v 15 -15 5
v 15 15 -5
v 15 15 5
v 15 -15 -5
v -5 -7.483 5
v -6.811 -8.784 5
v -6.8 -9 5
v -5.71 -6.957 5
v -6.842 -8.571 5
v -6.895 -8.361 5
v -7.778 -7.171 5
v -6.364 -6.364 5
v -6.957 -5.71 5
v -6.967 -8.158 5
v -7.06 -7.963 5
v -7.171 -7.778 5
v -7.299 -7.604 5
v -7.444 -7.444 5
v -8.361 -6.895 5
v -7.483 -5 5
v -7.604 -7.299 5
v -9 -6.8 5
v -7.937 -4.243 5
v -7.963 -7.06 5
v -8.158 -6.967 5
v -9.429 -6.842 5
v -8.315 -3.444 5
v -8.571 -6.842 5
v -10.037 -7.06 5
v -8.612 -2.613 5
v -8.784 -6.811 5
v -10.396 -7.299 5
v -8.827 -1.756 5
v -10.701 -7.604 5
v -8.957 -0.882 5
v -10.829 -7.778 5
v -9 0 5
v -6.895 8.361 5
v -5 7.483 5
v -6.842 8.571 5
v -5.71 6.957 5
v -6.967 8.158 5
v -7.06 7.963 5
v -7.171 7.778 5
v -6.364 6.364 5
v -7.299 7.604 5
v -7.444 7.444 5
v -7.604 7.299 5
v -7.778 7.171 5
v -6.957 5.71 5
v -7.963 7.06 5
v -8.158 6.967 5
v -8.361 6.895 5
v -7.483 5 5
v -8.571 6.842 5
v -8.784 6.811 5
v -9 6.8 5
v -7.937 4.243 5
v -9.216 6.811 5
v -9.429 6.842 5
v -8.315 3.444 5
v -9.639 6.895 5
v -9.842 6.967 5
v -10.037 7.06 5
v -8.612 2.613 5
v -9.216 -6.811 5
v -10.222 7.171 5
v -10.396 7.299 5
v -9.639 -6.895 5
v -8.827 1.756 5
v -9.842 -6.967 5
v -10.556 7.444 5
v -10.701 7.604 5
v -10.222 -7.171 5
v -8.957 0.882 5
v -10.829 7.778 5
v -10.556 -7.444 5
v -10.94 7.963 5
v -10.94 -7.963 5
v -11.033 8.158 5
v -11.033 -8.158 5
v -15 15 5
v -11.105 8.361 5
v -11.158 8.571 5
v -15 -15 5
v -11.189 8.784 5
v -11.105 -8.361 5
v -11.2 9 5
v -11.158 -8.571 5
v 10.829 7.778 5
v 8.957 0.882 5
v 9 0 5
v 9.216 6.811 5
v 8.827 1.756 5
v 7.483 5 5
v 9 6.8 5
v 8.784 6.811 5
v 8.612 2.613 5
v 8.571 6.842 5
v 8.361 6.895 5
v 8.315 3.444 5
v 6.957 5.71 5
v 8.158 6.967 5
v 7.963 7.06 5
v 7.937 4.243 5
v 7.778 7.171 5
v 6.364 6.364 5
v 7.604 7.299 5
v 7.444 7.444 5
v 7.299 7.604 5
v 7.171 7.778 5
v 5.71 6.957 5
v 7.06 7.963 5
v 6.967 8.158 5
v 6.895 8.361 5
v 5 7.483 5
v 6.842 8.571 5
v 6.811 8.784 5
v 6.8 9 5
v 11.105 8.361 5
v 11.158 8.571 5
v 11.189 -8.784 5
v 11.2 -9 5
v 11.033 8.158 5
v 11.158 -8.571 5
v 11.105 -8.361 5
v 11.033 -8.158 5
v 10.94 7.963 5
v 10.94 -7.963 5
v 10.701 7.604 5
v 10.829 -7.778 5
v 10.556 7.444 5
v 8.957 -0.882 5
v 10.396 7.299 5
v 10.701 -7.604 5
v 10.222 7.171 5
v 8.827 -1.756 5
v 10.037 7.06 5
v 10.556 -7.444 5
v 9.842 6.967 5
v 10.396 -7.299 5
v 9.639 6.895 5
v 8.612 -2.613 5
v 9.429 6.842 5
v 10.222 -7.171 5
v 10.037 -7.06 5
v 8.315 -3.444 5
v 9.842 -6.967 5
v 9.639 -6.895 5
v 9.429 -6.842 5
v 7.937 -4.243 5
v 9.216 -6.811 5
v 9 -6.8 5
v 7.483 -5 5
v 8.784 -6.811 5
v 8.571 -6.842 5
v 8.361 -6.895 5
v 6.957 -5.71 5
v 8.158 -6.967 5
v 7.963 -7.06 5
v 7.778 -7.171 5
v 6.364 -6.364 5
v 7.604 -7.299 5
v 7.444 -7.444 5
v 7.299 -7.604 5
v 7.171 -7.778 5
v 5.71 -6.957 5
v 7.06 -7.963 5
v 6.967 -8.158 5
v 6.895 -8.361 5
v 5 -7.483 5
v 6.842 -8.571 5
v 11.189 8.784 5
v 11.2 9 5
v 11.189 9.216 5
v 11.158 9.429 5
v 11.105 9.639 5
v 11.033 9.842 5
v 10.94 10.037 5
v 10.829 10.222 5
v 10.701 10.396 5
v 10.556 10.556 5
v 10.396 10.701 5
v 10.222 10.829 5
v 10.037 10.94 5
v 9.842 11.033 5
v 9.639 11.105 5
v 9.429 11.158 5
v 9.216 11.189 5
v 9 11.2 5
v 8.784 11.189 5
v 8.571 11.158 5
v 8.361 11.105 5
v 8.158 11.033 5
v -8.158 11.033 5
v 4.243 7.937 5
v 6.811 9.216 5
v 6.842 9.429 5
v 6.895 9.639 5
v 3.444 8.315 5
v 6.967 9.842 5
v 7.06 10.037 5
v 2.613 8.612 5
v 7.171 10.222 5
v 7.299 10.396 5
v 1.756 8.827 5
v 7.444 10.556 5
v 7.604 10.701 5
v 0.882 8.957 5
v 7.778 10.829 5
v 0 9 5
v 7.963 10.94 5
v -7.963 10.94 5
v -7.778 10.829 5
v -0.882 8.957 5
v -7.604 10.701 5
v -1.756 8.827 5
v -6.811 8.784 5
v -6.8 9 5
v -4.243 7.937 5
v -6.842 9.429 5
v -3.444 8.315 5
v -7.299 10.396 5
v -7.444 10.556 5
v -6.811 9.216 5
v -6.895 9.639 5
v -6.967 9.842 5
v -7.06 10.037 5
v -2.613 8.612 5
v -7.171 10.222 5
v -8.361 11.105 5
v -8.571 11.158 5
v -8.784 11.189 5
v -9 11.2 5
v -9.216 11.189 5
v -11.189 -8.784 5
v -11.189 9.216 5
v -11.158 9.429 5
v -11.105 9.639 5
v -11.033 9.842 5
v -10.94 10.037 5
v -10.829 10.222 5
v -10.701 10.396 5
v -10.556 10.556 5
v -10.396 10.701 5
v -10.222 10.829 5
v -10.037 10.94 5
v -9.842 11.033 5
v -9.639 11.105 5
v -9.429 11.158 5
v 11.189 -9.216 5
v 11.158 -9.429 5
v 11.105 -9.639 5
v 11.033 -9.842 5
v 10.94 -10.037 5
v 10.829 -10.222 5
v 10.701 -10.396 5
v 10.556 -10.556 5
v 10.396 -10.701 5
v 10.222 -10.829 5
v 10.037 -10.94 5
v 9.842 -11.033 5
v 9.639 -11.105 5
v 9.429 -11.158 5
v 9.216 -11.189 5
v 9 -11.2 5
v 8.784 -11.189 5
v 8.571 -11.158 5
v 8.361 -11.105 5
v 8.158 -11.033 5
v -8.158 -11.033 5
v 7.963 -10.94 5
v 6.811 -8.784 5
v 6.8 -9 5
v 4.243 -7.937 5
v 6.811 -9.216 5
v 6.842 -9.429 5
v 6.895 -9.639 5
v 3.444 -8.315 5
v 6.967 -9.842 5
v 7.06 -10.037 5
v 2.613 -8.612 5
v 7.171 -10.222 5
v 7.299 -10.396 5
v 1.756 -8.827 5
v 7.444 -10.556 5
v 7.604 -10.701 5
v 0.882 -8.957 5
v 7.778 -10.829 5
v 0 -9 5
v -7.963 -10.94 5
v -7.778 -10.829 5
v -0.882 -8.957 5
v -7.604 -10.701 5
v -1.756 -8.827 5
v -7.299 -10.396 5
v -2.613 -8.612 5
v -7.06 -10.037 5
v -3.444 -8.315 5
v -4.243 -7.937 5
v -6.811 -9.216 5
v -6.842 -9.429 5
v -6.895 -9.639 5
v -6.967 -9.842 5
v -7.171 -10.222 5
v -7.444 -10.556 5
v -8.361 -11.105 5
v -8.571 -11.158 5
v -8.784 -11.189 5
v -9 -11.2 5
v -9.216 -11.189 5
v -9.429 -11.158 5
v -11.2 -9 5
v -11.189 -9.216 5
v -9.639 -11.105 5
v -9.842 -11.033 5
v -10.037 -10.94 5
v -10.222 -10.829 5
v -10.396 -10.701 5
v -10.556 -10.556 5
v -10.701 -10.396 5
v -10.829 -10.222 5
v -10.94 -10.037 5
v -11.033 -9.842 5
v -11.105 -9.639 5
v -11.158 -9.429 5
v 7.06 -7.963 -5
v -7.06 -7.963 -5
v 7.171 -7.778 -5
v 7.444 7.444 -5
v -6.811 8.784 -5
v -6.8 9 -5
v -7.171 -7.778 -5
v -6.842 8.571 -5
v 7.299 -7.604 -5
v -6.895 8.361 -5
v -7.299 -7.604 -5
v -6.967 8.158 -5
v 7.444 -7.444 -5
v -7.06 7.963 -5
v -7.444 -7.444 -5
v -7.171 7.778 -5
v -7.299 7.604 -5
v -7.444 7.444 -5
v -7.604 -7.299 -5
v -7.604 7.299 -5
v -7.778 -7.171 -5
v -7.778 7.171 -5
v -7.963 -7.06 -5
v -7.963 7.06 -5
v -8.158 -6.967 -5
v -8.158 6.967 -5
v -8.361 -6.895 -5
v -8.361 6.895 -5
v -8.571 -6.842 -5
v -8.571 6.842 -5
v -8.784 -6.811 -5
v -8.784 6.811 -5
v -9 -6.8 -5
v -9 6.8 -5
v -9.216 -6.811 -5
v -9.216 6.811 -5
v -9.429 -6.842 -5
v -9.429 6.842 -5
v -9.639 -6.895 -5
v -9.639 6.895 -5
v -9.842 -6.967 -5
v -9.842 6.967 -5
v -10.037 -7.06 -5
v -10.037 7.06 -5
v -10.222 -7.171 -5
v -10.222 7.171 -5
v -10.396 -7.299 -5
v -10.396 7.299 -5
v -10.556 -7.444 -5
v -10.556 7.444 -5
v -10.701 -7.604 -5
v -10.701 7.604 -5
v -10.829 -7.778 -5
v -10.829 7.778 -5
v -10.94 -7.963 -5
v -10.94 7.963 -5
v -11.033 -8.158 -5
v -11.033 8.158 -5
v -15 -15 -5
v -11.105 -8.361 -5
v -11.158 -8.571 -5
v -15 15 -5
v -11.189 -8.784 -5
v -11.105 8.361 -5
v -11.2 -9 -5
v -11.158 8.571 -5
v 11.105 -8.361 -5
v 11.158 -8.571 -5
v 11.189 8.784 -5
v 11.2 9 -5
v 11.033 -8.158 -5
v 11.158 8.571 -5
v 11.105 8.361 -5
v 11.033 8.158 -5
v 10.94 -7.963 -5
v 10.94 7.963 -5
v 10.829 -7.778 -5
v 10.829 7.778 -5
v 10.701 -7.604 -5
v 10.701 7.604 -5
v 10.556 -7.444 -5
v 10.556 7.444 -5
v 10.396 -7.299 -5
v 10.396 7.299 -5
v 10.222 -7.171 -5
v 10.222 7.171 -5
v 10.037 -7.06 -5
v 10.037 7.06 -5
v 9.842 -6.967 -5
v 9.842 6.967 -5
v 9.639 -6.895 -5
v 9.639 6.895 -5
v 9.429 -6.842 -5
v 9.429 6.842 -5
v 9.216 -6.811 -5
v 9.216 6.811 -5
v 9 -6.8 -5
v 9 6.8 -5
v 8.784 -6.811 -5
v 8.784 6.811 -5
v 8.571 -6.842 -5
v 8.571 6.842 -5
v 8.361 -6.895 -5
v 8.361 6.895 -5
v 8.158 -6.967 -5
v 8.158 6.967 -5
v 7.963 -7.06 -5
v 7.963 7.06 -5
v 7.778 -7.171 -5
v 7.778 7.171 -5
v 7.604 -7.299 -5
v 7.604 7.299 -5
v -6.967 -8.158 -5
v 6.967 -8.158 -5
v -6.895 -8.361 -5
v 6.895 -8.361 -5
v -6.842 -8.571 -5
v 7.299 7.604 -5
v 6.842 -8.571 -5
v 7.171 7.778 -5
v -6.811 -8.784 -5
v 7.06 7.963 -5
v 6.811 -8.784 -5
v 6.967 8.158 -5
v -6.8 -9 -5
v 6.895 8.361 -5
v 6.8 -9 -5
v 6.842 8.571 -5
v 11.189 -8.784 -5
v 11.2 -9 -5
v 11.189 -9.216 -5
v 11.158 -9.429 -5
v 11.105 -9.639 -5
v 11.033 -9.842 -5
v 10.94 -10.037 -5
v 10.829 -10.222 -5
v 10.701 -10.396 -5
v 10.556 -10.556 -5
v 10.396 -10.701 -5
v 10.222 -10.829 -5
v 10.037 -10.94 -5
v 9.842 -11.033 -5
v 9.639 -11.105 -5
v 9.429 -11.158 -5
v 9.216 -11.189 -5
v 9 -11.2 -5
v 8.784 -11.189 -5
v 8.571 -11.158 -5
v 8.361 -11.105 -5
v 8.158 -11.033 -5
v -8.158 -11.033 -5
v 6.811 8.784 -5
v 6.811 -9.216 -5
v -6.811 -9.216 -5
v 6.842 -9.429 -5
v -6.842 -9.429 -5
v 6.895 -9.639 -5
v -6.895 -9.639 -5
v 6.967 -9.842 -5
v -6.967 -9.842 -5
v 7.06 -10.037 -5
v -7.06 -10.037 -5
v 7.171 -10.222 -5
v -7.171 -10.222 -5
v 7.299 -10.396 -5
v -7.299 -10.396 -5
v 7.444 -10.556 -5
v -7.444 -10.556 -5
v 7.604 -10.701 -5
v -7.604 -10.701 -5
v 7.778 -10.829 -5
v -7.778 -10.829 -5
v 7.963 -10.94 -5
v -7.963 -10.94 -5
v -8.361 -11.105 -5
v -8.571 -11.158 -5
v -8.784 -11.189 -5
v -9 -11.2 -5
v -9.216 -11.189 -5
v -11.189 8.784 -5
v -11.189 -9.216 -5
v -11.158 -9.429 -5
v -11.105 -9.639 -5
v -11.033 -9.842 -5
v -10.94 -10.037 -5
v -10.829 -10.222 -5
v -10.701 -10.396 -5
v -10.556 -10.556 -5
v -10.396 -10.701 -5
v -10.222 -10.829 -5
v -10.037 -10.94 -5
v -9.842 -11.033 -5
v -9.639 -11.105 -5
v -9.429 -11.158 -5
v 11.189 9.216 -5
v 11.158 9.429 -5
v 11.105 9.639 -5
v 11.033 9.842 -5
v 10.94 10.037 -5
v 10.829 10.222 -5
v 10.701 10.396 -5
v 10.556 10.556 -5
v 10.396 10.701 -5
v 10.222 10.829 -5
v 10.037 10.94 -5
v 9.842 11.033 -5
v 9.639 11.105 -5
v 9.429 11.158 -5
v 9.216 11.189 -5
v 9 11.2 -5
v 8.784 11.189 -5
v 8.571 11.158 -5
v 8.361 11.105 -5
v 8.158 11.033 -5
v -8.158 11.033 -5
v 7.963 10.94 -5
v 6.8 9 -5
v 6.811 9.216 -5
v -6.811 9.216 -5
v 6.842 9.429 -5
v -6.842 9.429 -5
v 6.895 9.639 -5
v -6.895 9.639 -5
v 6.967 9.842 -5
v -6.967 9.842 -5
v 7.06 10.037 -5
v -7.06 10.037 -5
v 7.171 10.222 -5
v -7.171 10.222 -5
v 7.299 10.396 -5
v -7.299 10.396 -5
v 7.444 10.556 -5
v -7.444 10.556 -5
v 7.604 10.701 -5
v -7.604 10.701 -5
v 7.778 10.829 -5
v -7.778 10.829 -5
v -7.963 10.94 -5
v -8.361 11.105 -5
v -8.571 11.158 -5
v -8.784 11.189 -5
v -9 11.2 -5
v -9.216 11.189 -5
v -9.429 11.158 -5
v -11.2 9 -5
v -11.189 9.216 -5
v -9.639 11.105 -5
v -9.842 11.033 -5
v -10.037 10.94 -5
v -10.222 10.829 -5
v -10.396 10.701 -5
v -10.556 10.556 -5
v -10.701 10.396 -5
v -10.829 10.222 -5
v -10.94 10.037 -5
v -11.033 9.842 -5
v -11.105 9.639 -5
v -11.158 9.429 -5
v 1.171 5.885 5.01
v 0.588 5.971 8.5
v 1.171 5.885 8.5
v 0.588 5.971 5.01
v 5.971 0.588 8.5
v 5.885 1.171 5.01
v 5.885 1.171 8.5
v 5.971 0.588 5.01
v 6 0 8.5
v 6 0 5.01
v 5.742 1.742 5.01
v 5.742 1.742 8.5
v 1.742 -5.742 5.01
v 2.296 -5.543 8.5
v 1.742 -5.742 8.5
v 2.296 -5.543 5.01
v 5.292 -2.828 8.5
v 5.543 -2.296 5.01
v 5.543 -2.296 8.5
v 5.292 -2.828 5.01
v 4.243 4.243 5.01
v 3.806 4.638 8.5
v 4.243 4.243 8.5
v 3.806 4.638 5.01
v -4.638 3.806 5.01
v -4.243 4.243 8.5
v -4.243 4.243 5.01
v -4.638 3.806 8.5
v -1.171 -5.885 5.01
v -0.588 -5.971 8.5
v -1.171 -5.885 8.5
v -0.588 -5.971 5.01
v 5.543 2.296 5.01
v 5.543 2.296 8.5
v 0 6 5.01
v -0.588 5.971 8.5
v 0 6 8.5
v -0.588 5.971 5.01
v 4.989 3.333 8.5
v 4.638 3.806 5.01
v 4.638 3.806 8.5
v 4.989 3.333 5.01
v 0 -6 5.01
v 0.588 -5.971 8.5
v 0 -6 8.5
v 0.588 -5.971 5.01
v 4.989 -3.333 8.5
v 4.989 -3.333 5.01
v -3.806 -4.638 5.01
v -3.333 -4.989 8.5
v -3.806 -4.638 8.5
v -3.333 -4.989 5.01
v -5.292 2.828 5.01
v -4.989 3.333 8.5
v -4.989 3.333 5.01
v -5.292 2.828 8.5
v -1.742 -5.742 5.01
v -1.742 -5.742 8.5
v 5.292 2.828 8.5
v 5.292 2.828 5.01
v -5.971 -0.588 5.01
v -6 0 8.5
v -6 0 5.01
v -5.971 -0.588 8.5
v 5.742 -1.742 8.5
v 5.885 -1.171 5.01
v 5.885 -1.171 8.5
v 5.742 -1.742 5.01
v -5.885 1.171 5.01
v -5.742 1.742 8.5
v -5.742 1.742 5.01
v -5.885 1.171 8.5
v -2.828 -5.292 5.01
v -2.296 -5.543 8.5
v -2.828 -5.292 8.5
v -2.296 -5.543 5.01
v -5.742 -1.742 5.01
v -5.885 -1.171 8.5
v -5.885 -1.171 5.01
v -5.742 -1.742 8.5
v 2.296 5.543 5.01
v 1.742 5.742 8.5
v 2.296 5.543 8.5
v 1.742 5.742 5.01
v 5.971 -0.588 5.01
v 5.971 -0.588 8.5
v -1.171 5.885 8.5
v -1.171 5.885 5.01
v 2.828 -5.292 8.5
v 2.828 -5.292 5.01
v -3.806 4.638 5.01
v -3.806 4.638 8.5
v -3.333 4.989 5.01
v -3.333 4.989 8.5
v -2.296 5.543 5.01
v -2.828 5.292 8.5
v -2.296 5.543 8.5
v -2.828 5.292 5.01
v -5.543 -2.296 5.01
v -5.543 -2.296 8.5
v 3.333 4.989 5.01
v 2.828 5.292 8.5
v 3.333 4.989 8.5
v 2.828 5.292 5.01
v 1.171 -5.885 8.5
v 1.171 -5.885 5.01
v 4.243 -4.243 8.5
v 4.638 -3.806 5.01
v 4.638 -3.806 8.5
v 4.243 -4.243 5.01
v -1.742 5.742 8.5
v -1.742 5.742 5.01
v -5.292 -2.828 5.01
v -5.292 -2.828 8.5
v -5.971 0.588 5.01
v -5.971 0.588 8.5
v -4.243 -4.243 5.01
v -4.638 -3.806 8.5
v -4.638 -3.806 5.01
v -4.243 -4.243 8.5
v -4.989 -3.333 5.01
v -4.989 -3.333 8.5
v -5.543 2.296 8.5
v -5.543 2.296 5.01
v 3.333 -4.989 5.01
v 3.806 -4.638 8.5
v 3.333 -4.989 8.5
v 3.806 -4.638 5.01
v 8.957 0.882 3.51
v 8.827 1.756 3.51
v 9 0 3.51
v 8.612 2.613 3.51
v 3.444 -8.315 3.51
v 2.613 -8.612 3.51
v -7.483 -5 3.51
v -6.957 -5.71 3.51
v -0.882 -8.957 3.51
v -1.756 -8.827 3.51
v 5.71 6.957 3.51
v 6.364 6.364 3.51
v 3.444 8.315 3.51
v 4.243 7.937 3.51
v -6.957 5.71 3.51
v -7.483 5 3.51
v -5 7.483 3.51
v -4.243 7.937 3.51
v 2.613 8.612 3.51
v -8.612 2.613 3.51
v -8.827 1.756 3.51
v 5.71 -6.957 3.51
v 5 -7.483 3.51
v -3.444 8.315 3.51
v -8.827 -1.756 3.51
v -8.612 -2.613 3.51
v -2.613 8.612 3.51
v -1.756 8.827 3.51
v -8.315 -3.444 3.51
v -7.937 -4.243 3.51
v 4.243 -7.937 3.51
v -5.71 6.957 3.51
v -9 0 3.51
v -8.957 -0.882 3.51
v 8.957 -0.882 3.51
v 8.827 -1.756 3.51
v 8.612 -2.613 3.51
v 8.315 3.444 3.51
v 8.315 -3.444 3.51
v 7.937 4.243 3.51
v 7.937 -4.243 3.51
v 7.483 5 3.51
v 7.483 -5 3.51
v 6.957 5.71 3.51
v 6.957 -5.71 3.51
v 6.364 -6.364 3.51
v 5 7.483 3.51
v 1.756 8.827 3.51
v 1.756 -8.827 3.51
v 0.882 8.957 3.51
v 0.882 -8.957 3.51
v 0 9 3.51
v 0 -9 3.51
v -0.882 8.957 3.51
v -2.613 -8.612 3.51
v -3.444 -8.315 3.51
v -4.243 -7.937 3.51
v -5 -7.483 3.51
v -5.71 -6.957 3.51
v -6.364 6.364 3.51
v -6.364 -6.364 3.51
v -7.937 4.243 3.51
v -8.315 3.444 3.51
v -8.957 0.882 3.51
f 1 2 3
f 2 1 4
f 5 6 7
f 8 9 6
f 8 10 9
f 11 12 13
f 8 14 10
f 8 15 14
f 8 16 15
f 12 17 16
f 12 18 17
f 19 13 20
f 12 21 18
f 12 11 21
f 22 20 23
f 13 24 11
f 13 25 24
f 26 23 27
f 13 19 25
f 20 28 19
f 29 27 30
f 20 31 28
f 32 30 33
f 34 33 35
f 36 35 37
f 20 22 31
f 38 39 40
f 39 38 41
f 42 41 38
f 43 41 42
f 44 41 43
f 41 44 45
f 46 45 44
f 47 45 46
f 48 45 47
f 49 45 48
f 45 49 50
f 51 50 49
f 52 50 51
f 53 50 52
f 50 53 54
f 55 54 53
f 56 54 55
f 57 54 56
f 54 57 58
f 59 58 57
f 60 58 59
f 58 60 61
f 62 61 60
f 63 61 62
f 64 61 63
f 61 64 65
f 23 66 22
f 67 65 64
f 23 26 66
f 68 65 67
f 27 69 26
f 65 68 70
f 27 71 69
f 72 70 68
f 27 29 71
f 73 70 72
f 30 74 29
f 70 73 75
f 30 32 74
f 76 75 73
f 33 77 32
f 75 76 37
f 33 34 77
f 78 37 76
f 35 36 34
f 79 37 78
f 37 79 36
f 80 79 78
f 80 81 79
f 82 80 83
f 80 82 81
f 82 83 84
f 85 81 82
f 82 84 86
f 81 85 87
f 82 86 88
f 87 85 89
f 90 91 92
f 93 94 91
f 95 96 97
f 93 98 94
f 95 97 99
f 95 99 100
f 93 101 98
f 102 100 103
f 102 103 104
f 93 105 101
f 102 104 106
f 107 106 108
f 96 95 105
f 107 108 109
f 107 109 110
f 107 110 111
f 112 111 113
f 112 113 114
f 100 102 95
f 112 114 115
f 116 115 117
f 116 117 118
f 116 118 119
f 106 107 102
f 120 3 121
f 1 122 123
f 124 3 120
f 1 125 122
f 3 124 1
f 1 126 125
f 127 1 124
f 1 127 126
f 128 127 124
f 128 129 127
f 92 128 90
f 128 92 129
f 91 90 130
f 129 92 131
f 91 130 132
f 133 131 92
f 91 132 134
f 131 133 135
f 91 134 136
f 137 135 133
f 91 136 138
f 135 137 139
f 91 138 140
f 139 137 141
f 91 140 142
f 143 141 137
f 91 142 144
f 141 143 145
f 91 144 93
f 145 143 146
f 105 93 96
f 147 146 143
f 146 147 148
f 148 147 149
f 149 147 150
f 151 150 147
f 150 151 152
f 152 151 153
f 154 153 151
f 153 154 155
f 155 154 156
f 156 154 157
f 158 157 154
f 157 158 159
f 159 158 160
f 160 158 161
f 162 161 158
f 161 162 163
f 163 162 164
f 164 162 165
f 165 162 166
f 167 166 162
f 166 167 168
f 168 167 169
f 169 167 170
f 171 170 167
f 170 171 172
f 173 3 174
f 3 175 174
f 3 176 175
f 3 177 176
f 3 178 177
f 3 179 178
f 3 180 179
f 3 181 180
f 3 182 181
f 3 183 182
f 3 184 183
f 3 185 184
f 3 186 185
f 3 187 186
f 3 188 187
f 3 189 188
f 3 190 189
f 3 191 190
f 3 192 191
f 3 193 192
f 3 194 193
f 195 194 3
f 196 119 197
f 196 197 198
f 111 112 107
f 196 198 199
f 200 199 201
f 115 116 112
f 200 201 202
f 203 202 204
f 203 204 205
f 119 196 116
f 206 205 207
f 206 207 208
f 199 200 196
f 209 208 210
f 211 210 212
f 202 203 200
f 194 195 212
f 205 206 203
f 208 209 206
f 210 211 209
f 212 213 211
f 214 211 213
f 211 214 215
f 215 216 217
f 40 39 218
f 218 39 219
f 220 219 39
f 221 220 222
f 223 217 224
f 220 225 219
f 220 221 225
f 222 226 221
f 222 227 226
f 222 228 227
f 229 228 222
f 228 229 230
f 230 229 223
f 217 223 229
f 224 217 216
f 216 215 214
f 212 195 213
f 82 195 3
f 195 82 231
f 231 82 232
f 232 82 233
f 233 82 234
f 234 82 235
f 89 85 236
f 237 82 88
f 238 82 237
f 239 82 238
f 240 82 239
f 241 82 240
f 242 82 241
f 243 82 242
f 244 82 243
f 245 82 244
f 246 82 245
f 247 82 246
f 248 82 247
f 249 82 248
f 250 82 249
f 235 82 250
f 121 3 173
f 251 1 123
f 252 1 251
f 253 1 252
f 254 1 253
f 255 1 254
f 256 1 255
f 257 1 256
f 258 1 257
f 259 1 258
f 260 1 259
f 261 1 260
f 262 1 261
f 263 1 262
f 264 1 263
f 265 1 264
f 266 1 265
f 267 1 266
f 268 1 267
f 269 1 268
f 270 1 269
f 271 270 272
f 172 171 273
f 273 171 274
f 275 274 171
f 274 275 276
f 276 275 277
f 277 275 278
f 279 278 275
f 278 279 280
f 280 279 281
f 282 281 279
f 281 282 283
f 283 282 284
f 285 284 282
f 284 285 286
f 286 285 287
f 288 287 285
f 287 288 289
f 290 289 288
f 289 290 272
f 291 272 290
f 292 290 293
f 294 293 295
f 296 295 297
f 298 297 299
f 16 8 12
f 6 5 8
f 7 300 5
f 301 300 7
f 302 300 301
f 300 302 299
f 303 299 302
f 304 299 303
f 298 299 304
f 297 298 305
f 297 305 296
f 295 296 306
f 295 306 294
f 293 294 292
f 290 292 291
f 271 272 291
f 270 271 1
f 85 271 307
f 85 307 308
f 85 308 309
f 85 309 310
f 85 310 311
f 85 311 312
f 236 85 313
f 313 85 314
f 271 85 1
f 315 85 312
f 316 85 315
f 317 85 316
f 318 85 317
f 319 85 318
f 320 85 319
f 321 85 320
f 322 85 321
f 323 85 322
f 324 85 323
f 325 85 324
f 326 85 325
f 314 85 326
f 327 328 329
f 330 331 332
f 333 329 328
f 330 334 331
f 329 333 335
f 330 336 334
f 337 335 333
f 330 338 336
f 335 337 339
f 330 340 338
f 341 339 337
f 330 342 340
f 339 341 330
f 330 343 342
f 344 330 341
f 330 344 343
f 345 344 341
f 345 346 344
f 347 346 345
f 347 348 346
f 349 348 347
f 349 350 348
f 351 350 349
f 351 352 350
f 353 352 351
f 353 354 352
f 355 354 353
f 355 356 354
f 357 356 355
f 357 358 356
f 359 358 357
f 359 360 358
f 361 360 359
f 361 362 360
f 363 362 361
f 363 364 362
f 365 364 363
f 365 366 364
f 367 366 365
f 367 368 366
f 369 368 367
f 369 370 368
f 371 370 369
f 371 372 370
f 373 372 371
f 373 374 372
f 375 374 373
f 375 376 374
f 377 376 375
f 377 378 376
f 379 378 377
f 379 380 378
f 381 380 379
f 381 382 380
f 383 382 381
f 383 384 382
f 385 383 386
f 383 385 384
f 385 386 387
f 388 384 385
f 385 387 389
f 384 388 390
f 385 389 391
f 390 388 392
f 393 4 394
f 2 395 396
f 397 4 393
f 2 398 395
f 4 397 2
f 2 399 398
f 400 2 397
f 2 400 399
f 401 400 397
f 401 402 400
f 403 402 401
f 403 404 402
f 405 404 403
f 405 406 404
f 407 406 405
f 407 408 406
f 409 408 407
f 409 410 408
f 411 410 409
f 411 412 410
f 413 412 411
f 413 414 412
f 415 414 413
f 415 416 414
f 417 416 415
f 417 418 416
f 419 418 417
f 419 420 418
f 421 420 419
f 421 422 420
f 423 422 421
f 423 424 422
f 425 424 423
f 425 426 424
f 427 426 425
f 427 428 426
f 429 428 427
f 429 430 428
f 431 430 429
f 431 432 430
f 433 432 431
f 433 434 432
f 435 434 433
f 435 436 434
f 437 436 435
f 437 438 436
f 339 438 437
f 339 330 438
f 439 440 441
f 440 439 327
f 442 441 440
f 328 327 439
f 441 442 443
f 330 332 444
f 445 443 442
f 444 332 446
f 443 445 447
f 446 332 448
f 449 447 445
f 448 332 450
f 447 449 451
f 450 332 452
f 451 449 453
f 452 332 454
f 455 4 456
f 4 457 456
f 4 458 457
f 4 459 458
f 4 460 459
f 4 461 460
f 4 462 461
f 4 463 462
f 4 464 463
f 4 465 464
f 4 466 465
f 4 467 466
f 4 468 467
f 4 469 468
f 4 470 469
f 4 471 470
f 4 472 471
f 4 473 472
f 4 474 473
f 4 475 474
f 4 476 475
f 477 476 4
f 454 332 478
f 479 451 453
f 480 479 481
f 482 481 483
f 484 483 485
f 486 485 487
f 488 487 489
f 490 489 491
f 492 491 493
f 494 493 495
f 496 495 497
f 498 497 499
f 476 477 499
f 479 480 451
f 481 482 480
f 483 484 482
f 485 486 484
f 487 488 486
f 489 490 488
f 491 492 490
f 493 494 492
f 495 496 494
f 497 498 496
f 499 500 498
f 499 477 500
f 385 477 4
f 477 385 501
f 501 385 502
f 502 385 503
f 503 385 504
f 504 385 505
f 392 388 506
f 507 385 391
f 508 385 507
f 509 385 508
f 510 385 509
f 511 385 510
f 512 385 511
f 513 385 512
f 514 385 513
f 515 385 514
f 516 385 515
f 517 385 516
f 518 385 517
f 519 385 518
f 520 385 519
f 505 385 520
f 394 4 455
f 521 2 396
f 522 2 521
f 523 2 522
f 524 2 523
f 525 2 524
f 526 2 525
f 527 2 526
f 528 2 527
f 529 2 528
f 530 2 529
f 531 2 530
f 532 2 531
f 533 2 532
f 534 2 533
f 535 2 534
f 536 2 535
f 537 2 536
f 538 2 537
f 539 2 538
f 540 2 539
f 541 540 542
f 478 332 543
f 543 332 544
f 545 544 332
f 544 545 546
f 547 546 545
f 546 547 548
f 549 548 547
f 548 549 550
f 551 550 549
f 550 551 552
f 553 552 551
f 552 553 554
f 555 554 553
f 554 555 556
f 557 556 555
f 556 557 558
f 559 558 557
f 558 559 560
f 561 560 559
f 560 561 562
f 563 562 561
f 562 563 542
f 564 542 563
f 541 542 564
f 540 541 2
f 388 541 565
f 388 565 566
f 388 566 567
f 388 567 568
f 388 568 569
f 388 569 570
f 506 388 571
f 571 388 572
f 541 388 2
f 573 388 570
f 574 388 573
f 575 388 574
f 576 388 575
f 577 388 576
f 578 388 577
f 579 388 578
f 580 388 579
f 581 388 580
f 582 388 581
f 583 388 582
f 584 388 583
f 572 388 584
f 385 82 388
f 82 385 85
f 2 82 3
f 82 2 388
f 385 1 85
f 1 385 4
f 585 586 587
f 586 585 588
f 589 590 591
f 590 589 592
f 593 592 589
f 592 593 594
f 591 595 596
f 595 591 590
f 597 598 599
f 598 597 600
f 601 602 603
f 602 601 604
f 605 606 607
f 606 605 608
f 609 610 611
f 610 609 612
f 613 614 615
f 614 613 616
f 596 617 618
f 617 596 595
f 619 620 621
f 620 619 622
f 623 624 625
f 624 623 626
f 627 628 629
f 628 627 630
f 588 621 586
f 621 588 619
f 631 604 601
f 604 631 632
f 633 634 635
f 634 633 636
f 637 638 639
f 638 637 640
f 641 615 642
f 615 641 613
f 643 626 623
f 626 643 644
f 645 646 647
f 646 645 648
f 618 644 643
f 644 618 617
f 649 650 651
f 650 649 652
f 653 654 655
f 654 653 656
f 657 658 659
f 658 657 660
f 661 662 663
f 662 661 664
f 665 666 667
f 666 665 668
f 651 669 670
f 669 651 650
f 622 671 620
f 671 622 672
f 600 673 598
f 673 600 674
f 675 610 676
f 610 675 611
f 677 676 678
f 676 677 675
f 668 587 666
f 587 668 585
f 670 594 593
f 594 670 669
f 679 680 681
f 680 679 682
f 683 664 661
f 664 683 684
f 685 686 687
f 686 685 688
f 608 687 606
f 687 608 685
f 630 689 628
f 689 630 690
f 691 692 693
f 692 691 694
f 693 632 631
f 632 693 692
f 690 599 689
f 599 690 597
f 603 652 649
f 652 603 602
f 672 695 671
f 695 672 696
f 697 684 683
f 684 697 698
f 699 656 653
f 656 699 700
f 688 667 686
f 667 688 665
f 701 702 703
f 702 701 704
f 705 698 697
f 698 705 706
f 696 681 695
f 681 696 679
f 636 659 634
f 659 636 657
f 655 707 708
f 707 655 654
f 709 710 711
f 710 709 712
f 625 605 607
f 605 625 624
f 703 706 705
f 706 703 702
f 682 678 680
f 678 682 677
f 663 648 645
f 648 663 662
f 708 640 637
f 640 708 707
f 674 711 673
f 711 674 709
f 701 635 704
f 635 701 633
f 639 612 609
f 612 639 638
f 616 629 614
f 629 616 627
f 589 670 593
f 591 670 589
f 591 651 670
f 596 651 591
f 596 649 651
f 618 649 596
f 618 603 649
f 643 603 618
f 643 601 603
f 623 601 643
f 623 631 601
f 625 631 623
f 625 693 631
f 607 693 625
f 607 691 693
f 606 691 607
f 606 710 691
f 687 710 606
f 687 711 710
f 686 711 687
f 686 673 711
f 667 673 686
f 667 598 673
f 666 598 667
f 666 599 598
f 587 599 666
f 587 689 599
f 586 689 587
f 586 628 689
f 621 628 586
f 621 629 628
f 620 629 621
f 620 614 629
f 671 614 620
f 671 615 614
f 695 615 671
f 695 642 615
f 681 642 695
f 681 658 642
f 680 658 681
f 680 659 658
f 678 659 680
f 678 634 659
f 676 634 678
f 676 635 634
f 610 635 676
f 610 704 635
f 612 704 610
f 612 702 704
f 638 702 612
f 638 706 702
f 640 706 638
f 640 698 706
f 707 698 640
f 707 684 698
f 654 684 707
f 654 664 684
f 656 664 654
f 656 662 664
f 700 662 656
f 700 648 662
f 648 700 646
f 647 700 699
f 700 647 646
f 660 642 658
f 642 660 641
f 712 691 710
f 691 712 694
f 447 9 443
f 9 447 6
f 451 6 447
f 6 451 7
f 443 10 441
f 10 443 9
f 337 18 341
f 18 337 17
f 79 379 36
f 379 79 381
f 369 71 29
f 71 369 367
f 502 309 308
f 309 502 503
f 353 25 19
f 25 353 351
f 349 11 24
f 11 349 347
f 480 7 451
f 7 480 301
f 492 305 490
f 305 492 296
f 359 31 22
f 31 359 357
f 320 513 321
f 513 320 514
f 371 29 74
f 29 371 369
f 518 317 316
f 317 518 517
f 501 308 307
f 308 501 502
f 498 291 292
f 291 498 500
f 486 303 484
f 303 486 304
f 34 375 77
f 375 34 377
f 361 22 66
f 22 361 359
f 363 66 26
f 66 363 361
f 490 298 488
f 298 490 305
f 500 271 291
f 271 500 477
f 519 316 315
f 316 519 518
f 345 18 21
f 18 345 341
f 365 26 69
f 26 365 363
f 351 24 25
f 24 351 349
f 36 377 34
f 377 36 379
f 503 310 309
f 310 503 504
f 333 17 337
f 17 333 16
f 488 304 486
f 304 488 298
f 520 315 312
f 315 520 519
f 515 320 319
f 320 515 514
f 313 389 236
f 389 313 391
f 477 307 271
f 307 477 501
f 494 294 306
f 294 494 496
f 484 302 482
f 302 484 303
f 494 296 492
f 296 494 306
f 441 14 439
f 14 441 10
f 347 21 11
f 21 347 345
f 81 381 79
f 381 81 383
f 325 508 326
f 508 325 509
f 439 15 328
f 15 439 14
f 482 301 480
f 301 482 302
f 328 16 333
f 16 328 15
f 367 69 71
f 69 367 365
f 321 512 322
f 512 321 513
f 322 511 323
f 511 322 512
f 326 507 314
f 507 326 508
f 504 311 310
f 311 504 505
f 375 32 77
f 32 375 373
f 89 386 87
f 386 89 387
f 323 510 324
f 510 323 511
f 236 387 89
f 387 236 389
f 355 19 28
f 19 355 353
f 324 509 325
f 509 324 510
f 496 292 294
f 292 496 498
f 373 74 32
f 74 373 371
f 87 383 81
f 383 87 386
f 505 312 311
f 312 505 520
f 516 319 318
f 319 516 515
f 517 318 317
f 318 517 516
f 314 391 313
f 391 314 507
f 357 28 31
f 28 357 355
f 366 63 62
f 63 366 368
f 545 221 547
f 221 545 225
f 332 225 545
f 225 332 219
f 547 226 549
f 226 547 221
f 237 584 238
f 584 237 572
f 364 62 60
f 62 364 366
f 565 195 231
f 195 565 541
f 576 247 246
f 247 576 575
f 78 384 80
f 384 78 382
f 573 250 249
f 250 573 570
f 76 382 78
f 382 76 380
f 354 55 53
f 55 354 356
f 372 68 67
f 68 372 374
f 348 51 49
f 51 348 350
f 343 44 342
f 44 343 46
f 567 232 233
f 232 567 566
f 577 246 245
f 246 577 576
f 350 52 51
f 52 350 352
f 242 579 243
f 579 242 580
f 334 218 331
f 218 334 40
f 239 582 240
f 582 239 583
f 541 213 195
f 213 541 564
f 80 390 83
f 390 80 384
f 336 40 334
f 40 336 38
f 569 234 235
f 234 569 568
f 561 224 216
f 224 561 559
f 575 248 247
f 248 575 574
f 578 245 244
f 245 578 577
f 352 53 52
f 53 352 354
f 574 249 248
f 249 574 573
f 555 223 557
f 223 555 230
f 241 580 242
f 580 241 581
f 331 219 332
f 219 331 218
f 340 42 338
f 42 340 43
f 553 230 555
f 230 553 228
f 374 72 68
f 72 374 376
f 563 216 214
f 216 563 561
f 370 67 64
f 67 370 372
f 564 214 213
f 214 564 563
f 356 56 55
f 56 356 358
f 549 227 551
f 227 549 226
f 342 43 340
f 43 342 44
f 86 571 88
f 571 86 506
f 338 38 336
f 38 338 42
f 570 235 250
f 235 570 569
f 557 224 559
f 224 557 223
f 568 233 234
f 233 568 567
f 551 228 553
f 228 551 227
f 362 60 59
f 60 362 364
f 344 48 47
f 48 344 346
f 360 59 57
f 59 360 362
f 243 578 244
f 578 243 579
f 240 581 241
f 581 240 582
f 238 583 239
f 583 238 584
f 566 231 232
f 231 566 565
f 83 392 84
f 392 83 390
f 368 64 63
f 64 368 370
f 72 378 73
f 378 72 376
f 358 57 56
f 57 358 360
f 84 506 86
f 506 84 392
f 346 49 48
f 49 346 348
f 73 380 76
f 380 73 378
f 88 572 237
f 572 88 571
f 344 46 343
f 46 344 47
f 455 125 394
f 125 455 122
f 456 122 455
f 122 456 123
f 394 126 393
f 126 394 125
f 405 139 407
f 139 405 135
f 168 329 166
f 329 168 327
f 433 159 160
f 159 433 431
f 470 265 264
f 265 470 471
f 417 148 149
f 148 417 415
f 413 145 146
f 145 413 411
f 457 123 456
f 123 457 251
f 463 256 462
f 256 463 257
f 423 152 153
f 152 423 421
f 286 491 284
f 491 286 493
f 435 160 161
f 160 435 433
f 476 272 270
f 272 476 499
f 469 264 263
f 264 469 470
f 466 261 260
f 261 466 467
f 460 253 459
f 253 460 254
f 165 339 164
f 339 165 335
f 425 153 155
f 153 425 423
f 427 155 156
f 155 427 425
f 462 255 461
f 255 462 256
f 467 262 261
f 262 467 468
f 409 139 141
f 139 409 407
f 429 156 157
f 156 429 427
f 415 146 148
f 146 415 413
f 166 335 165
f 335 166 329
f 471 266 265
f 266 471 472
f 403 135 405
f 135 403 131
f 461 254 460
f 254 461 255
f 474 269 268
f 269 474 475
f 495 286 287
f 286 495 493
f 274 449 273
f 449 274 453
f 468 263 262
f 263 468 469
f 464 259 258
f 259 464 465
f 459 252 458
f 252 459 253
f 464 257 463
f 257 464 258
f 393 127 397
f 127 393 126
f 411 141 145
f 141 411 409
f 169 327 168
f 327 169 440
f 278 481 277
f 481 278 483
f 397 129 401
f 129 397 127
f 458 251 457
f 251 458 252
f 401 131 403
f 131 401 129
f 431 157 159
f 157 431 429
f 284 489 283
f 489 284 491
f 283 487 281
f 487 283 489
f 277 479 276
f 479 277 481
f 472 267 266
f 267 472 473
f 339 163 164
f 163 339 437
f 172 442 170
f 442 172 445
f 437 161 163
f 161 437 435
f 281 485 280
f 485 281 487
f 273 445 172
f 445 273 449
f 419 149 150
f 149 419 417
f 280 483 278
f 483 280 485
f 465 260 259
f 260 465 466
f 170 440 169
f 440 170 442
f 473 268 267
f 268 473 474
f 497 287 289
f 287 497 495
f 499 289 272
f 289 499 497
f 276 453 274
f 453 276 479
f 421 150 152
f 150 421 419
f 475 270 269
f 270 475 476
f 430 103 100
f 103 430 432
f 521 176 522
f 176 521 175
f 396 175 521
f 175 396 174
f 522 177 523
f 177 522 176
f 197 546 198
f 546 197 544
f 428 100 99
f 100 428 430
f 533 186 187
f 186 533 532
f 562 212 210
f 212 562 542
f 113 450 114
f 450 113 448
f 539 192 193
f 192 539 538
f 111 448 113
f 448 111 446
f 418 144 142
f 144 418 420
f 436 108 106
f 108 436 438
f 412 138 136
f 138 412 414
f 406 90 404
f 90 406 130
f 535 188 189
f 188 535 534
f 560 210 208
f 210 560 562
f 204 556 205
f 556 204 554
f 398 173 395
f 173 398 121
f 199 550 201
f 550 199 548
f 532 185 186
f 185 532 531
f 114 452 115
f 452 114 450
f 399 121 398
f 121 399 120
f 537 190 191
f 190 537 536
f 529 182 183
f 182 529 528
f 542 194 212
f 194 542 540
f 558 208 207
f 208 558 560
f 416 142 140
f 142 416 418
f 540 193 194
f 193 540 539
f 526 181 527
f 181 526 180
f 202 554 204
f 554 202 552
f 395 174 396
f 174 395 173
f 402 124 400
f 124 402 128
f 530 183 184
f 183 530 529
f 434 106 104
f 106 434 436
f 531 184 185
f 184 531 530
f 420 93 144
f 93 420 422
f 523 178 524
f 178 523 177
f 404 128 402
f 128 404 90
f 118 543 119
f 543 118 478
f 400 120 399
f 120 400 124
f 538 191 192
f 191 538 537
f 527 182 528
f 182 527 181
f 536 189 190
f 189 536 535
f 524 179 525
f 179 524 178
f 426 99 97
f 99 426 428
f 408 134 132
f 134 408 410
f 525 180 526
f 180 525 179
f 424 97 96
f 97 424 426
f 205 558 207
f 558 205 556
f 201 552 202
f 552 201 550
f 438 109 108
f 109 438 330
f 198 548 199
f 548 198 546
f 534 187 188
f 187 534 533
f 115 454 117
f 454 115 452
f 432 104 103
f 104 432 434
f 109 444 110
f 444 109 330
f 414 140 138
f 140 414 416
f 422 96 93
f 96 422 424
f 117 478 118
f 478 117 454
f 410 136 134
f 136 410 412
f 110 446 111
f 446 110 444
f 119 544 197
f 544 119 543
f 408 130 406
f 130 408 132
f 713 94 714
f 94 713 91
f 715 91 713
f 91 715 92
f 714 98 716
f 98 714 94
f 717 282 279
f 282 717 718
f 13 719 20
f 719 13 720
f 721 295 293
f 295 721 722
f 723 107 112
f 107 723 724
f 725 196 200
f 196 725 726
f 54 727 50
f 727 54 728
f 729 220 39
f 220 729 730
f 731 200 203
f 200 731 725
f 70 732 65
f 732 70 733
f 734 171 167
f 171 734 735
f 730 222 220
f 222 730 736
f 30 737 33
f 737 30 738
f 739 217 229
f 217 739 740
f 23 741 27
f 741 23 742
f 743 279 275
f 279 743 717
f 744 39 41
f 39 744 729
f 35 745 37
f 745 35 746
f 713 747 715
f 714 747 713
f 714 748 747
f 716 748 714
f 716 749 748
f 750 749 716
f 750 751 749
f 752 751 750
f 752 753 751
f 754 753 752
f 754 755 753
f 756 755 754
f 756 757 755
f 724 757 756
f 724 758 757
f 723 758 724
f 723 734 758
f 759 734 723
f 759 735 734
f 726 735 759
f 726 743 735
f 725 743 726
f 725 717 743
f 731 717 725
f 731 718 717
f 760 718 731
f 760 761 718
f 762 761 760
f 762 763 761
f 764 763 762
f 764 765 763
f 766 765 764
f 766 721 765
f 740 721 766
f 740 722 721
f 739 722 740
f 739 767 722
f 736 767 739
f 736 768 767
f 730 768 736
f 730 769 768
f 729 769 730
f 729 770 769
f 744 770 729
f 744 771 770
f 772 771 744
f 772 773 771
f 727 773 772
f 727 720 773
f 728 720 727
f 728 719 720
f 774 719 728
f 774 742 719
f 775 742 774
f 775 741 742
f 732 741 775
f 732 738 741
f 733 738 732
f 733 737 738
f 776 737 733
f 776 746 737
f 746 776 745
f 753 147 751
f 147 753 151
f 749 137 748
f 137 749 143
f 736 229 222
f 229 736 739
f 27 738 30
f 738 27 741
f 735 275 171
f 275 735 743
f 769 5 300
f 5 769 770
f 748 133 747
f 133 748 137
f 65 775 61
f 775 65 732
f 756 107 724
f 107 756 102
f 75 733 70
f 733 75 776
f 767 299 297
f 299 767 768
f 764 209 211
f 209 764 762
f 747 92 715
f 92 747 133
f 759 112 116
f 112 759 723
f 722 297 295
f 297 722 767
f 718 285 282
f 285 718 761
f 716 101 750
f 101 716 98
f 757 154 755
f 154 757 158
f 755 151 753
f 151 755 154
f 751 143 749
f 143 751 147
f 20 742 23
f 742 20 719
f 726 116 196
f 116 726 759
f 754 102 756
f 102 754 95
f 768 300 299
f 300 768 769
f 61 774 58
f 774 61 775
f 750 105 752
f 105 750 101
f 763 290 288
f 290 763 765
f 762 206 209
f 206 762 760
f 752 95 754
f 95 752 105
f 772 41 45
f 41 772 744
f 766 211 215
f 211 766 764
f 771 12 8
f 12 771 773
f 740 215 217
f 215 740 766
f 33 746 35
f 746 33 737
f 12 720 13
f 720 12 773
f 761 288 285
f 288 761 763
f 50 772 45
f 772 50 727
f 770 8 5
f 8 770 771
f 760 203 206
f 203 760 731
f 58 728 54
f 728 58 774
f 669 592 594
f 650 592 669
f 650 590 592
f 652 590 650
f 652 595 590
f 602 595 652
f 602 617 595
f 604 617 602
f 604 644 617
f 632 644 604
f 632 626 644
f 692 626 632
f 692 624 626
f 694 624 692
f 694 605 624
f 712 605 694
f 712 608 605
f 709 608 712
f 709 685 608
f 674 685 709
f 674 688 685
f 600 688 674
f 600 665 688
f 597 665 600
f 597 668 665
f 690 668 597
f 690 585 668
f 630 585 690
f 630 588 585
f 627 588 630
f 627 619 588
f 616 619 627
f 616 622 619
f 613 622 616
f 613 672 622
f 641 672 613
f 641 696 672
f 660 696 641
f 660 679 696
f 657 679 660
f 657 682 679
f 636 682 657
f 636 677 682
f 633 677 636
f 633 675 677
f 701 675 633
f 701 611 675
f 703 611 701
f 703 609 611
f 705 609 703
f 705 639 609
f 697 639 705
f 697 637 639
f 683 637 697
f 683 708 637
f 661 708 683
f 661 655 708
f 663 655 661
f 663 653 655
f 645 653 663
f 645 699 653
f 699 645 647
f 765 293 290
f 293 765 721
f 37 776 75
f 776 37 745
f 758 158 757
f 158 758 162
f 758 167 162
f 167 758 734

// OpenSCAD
$fn = 64;

// Rectangular base with component-like features (holes + top boss), all connected
module component() {
    // Dimensions chosen to match views: square front/back/left/right, rectangular top/bottom
    base_xy = 30;
    base_h  = 10;

    boss_r = 6;
    boss_h = 4;

    hole_r = 2.2;
    hole_inset = 6; // from each edge

    difference() {
        union() {
            // Main body
            cube([base_xy, base_xy, base_h], center=true);

            // Top boss (connected with slight overlap)
            translate([0, 0, base_h/2 + boss_h/2 - 0.5])
                cylinder(r=boss_r, h=boss_h, center=true);
        }

        // 4 through mounting holes (component-specific detail)
        for (sx = [-1, 1], sy = [-1, 1]) {
            translate([sx*(base_xy/2 - hole_inset), sy*(base_xy/2 - hole_inset), 0])
                cylinder(r=hole_r, h=base_h + boss_h + 2, center=true);
        }

        // Shallow top recess around boss to add more identifiable geometry
        recess_r = boss_r + 3;
        recess_h = 1.5;
        translate([0, 0, base_h/2 - recess_h/2 + 0.01])
            cylinder(r=recess_r, h=recess_h, center=true);
    }
}

component();
